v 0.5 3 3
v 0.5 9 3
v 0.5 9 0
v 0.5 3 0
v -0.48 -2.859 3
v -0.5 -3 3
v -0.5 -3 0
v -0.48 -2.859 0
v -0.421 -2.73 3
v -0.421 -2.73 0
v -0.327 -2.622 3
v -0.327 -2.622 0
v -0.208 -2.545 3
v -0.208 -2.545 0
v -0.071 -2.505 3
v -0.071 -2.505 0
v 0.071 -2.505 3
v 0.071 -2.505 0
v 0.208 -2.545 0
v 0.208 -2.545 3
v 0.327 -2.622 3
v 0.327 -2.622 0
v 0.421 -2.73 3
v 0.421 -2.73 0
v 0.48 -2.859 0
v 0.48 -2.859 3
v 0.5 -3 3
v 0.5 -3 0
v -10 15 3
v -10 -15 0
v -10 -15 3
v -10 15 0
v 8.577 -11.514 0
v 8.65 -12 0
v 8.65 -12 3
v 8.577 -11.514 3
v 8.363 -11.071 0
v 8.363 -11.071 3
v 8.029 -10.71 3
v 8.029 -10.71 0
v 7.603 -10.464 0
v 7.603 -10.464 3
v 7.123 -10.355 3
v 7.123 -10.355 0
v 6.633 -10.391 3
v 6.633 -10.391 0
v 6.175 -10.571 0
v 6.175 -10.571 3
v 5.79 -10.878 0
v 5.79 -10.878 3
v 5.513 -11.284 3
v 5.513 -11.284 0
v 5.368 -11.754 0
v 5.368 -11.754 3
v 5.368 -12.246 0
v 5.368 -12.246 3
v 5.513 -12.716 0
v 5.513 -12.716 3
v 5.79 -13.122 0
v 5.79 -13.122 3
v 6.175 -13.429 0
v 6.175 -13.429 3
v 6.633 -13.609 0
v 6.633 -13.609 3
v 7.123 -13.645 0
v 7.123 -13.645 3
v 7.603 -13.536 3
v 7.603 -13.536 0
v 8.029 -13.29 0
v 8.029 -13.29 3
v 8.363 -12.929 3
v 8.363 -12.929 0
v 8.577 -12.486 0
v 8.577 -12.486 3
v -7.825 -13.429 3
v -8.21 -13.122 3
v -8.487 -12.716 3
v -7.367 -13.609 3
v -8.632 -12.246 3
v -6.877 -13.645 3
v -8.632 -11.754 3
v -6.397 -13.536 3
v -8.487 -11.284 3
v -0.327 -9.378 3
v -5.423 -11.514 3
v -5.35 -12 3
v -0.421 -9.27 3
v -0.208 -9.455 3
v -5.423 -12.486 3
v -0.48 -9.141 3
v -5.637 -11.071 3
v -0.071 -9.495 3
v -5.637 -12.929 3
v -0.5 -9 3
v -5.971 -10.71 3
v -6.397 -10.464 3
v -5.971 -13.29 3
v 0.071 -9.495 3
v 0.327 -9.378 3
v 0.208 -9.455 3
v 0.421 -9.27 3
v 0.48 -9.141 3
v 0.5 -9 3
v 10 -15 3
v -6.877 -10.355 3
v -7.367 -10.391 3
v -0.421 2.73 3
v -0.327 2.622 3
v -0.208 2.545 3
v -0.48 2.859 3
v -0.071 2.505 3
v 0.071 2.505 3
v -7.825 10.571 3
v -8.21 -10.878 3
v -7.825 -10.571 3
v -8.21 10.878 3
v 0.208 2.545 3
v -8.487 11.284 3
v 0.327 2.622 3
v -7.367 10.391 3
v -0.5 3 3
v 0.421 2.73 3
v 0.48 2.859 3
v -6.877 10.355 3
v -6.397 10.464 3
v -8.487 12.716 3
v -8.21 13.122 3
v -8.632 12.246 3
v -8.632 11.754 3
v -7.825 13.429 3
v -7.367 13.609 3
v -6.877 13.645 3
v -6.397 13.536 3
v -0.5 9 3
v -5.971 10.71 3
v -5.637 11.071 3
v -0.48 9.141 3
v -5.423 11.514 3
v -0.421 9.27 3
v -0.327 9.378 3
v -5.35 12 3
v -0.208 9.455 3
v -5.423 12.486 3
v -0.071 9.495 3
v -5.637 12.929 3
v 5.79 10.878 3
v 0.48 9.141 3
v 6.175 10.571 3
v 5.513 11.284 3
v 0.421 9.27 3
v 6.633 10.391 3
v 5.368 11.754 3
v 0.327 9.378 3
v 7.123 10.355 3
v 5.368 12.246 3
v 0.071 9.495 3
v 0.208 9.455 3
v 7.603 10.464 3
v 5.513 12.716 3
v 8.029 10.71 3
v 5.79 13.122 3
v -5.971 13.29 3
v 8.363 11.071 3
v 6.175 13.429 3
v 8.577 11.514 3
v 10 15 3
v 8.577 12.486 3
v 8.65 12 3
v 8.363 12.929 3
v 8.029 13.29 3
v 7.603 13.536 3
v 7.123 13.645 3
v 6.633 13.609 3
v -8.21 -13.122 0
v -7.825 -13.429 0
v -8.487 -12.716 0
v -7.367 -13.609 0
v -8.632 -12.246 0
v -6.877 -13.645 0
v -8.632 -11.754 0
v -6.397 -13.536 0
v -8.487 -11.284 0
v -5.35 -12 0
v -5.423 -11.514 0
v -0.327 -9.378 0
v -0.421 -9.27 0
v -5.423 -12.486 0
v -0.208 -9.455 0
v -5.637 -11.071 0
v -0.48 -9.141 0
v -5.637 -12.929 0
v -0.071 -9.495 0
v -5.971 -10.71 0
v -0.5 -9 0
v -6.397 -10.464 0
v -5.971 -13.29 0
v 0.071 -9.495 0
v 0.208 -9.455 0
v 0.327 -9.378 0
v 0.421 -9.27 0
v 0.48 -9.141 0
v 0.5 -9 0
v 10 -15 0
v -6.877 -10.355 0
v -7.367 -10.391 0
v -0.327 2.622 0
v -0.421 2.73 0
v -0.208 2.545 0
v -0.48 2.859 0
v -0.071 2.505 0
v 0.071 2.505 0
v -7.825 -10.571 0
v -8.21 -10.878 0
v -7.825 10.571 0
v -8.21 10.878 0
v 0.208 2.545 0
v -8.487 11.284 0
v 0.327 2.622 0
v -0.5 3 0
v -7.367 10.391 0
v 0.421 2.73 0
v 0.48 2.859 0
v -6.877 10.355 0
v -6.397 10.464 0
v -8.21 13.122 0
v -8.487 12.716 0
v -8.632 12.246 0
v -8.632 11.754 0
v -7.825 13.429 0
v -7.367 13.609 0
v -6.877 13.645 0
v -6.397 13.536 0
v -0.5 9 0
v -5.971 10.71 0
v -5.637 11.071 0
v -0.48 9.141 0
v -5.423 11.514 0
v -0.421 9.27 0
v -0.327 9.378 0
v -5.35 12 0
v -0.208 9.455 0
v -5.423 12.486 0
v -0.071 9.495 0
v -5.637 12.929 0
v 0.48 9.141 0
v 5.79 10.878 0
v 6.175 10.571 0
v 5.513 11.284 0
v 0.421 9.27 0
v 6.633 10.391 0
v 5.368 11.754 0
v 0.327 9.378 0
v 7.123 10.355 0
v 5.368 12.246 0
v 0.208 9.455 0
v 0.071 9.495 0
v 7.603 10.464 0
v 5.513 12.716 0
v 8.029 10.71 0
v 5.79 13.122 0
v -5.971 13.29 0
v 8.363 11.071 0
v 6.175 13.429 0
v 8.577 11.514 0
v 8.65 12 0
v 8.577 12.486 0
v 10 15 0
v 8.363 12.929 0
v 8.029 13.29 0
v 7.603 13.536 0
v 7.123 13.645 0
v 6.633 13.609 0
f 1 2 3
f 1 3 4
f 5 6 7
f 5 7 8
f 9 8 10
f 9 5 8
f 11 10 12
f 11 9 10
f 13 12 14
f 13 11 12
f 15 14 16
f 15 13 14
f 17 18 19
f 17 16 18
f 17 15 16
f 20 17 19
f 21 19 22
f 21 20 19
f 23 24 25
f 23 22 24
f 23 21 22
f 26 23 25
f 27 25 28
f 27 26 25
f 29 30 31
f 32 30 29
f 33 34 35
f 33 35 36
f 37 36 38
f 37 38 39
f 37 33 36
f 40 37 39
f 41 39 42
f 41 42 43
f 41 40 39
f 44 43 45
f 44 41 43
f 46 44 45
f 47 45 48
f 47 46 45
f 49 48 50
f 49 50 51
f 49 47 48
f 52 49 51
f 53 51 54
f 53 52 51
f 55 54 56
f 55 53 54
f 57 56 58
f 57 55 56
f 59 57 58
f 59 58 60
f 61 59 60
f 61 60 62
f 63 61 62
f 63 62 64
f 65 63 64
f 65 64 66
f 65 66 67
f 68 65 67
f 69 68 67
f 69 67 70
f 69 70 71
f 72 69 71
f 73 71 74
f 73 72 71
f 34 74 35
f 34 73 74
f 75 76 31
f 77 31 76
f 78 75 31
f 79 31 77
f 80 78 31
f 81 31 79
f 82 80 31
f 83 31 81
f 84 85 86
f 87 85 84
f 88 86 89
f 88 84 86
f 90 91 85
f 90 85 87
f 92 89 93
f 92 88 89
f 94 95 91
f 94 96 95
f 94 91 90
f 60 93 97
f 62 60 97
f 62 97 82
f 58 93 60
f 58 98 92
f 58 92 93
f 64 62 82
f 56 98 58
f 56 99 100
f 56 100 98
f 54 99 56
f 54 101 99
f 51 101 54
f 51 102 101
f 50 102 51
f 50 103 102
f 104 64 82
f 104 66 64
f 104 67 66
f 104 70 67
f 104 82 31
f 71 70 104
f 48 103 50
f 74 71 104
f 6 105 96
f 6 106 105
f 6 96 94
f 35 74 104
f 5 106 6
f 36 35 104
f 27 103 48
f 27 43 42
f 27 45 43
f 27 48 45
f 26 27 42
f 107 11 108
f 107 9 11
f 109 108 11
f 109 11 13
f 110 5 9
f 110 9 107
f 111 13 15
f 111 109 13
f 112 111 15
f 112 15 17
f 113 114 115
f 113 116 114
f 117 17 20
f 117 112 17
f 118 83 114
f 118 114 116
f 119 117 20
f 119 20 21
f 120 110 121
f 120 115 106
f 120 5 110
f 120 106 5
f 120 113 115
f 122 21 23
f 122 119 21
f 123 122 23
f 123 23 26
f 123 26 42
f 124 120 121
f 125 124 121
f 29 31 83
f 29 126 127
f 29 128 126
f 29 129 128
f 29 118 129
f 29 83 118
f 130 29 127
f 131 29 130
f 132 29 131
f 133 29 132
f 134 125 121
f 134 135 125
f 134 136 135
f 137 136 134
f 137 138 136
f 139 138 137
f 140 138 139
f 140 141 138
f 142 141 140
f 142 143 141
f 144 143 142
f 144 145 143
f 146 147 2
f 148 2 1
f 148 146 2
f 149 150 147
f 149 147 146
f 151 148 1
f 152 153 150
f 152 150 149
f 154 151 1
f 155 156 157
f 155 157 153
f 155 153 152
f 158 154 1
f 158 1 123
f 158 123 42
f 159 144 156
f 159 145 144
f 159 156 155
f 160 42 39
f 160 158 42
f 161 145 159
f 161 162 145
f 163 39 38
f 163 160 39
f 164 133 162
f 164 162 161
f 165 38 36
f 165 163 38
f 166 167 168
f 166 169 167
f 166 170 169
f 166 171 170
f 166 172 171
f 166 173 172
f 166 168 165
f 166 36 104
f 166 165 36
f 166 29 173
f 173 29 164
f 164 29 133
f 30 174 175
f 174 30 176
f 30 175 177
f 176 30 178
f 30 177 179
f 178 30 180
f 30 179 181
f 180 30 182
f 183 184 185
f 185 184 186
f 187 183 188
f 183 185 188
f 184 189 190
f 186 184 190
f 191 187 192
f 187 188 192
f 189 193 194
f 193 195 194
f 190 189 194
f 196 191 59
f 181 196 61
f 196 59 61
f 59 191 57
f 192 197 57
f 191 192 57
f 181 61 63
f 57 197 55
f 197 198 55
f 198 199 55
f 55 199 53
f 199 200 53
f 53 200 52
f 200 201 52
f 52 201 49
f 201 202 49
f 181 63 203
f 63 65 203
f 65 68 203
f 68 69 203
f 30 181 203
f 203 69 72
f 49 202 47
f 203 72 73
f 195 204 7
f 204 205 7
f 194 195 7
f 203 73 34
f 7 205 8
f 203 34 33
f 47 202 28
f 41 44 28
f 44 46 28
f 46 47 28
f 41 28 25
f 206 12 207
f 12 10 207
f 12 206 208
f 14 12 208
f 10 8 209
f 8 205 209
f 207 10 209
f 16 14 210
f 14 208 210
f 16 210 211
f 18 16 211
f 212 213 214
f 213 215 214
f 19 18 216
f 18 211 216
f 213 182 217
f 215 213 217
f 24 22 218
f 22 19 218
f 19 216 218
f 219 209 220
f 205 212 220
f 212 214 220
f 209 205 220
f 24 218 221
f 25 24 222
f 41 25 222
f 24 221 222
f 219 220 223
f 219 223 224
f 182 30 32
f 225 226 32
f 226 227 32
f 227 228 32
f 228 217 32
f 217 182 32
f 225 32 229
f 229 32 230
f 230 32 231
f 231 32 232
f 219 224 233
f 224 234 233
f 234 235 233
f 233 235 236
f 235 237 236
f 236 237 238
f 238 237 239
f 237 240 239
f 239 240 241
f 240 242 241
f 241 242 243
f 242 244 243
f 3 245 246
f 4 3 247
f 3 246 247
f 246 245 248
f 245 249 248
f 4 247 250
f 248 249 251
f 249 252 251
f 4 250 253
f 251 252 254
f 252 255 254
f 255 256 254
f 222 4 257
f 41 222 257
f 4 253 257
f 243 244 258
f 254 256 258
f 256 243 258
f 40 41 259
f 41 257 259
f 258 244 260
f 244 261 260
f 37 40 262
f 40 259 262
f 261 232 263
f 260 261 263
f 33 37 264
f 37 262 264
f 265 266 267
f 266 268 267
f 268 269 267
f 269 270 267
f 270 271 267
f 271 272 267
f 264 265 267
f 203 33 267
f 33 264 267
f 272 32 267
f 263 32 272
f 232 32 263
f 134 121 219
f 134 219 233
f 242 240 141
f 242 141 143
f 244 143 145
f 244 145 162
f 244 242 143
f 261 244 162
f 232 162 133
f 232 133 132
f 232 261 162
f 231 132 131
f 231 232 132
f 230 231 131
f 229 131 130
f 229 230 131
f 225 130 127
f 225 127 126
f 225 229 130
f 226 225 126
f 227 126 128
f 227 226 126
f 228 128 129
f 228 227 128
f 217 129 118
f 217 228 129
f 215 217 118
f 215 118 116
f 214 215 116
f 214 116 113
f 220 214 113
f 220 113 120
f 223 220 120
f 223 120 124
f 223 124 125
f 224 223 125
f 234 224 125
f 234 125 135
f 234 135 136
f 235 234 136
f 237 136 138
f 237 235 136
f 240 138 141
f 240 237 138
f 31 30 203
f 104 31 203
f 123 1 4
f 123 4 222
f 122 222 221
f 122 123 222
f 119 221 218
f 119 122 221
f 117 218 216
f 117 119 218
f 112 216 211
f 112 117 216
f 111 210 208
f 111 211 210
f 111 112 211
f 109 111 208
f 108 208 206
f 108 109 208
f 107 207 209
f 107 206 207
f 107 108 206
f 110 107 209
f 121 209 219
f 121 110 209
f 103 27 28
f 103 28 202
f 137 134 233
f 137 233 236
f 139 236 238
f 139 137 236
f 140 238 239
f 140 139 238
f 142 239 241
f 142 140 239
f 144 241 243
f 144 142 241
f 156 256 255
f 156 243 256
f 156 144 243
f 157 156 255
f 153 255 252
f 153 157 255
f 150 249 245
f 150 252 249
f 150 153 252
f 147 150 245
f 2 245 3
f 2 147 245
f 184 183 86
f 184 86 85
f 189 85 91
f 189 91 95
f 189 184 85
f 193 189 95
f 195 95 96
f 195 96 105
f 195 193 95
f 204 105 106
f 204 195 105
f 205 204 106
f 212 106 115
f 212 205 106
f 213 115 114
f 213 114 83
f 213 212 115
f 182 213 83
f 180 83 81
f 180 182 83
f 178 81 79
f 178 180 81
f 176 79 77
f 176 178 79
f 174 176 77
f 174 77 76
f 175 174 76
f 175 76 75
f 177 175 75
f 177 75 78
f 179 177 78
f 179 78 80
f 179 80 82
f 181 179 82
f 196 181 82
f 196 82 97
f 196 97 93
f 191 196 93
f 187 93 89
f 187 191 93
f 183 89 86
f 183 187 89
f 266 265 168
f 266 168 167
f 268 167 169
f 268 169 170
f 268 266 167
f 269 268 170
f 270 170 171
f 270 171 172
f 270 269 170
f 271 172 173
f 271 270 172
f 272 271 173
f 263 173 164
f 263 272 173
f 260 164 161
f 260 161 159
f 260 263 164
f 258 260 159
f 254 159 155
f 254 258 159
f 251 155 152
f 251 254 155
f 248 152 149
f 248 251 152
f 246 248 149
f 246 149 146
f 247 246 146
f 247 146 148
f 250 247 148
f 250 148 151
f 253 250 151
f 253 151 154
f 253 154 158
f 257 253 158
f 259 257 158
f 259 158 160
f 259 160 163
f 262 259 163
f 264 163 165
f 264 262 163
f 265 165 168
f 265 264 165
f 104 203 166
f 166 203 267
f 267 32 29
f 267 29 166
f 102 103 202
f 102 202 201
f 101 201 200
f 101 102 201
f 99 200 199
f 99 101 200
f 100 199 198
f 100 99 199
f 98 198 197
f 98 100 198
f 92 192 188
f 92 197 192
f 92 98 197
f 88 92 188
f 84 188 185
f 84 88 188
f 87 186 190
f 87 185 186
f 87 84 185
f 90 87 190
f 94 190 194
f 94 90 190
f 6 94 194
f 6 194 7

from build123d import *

# Parameters (mm, degrees)
CROQUIS1_W              = 20
CROQUIS1_H              = 30
CROQUIS1_R              = 1.65
SALIENTE_EXTRUIR1_DEPTH = 3
CORTAR_EXTRUIR1_REACH   = 5


with BuildPart() as part:
    # Croquis1 → Saliente-Extruir1 (new body)
    with BuildSketch(Plane.XY):
        Rectangle(CROQUIS1_W, CROQUIS1_H)
        with Locations((-7, 12)):
            Circle(CROQUIS1_R, mode=Mode.SUBTRACT)
        with Locations((7, 12)):
            Circle(CROQUIS1_R, mode=Mode.SUBTRACT)
        with Locations((7, -12)):
            Circle(CROQUIS1_R, mode=Mode.SUBTRACT)
        with Locations((-7, -12)):
            Circle(CROQUIS1_R, mode=Mode.SUBTRACT)
    extrude(amount=SALIENTE_EXTRUIR1_DEPTH)

    # Croquis2 → Cortar-Extruir1 (cut, up to next)
    with BuildSketch(Plane.XY.offset(3), mode=Mode.PRIVATE) as cortar_extruir1_sk1:
        with BuildLine():
            Line((-0.5, -9), (-0.5, -3))
            ThreePointArc((-0.5, -3), (0, -2.5), (0.5, -3))
            Line((0.5, -3), (0.5, -9))
            ThreePointArc((0.5, -9), (0, -9.5), (-0.5, -9))
        make_face()
    cortar_extruir1_tool1 = extrude(cortar_extruir1_sk1.sketch, amount=-CORTAR_EXTRUIR1_REACH, mode=Mode.PRIVATE) & part.part
    add(cortar_extruir1_tool1.solids().sort_by_distance((0, -6, 3))[0], mode=Mode.SUBTRACT)
    # Croquis2 → Cortar-Extruir1 (cut, up to next)
    with BuildSketch(Plane.XY.offset(3), mode=Mode.PRIVATE) as cortar_extruir1_sk2:
        with BuildLine():
            Line((-0.5, 3), (-0.5, 9))
            ThreePointArc((-0.5, 9), (0, 9.5), (0.5, 9))
            Line((0.5, 9), (0.5, 3))
            ThreePointArc((0.5, 3), (0, 2.5), (-0.5, 3))
        make_face()
    cortar_extruir1_tool2 = extrude(cortar_extruir1_sk2.sketch, amount=-CORTAR_EXTRUIR1_REACH, mode=Mode.PRIVATE) & part.part
    add(cortar_extruir1_tool2.solids().sort_by_distance((0, 6, 3))[0], mode=Mode.SUBTRACT)


solid = part.part
